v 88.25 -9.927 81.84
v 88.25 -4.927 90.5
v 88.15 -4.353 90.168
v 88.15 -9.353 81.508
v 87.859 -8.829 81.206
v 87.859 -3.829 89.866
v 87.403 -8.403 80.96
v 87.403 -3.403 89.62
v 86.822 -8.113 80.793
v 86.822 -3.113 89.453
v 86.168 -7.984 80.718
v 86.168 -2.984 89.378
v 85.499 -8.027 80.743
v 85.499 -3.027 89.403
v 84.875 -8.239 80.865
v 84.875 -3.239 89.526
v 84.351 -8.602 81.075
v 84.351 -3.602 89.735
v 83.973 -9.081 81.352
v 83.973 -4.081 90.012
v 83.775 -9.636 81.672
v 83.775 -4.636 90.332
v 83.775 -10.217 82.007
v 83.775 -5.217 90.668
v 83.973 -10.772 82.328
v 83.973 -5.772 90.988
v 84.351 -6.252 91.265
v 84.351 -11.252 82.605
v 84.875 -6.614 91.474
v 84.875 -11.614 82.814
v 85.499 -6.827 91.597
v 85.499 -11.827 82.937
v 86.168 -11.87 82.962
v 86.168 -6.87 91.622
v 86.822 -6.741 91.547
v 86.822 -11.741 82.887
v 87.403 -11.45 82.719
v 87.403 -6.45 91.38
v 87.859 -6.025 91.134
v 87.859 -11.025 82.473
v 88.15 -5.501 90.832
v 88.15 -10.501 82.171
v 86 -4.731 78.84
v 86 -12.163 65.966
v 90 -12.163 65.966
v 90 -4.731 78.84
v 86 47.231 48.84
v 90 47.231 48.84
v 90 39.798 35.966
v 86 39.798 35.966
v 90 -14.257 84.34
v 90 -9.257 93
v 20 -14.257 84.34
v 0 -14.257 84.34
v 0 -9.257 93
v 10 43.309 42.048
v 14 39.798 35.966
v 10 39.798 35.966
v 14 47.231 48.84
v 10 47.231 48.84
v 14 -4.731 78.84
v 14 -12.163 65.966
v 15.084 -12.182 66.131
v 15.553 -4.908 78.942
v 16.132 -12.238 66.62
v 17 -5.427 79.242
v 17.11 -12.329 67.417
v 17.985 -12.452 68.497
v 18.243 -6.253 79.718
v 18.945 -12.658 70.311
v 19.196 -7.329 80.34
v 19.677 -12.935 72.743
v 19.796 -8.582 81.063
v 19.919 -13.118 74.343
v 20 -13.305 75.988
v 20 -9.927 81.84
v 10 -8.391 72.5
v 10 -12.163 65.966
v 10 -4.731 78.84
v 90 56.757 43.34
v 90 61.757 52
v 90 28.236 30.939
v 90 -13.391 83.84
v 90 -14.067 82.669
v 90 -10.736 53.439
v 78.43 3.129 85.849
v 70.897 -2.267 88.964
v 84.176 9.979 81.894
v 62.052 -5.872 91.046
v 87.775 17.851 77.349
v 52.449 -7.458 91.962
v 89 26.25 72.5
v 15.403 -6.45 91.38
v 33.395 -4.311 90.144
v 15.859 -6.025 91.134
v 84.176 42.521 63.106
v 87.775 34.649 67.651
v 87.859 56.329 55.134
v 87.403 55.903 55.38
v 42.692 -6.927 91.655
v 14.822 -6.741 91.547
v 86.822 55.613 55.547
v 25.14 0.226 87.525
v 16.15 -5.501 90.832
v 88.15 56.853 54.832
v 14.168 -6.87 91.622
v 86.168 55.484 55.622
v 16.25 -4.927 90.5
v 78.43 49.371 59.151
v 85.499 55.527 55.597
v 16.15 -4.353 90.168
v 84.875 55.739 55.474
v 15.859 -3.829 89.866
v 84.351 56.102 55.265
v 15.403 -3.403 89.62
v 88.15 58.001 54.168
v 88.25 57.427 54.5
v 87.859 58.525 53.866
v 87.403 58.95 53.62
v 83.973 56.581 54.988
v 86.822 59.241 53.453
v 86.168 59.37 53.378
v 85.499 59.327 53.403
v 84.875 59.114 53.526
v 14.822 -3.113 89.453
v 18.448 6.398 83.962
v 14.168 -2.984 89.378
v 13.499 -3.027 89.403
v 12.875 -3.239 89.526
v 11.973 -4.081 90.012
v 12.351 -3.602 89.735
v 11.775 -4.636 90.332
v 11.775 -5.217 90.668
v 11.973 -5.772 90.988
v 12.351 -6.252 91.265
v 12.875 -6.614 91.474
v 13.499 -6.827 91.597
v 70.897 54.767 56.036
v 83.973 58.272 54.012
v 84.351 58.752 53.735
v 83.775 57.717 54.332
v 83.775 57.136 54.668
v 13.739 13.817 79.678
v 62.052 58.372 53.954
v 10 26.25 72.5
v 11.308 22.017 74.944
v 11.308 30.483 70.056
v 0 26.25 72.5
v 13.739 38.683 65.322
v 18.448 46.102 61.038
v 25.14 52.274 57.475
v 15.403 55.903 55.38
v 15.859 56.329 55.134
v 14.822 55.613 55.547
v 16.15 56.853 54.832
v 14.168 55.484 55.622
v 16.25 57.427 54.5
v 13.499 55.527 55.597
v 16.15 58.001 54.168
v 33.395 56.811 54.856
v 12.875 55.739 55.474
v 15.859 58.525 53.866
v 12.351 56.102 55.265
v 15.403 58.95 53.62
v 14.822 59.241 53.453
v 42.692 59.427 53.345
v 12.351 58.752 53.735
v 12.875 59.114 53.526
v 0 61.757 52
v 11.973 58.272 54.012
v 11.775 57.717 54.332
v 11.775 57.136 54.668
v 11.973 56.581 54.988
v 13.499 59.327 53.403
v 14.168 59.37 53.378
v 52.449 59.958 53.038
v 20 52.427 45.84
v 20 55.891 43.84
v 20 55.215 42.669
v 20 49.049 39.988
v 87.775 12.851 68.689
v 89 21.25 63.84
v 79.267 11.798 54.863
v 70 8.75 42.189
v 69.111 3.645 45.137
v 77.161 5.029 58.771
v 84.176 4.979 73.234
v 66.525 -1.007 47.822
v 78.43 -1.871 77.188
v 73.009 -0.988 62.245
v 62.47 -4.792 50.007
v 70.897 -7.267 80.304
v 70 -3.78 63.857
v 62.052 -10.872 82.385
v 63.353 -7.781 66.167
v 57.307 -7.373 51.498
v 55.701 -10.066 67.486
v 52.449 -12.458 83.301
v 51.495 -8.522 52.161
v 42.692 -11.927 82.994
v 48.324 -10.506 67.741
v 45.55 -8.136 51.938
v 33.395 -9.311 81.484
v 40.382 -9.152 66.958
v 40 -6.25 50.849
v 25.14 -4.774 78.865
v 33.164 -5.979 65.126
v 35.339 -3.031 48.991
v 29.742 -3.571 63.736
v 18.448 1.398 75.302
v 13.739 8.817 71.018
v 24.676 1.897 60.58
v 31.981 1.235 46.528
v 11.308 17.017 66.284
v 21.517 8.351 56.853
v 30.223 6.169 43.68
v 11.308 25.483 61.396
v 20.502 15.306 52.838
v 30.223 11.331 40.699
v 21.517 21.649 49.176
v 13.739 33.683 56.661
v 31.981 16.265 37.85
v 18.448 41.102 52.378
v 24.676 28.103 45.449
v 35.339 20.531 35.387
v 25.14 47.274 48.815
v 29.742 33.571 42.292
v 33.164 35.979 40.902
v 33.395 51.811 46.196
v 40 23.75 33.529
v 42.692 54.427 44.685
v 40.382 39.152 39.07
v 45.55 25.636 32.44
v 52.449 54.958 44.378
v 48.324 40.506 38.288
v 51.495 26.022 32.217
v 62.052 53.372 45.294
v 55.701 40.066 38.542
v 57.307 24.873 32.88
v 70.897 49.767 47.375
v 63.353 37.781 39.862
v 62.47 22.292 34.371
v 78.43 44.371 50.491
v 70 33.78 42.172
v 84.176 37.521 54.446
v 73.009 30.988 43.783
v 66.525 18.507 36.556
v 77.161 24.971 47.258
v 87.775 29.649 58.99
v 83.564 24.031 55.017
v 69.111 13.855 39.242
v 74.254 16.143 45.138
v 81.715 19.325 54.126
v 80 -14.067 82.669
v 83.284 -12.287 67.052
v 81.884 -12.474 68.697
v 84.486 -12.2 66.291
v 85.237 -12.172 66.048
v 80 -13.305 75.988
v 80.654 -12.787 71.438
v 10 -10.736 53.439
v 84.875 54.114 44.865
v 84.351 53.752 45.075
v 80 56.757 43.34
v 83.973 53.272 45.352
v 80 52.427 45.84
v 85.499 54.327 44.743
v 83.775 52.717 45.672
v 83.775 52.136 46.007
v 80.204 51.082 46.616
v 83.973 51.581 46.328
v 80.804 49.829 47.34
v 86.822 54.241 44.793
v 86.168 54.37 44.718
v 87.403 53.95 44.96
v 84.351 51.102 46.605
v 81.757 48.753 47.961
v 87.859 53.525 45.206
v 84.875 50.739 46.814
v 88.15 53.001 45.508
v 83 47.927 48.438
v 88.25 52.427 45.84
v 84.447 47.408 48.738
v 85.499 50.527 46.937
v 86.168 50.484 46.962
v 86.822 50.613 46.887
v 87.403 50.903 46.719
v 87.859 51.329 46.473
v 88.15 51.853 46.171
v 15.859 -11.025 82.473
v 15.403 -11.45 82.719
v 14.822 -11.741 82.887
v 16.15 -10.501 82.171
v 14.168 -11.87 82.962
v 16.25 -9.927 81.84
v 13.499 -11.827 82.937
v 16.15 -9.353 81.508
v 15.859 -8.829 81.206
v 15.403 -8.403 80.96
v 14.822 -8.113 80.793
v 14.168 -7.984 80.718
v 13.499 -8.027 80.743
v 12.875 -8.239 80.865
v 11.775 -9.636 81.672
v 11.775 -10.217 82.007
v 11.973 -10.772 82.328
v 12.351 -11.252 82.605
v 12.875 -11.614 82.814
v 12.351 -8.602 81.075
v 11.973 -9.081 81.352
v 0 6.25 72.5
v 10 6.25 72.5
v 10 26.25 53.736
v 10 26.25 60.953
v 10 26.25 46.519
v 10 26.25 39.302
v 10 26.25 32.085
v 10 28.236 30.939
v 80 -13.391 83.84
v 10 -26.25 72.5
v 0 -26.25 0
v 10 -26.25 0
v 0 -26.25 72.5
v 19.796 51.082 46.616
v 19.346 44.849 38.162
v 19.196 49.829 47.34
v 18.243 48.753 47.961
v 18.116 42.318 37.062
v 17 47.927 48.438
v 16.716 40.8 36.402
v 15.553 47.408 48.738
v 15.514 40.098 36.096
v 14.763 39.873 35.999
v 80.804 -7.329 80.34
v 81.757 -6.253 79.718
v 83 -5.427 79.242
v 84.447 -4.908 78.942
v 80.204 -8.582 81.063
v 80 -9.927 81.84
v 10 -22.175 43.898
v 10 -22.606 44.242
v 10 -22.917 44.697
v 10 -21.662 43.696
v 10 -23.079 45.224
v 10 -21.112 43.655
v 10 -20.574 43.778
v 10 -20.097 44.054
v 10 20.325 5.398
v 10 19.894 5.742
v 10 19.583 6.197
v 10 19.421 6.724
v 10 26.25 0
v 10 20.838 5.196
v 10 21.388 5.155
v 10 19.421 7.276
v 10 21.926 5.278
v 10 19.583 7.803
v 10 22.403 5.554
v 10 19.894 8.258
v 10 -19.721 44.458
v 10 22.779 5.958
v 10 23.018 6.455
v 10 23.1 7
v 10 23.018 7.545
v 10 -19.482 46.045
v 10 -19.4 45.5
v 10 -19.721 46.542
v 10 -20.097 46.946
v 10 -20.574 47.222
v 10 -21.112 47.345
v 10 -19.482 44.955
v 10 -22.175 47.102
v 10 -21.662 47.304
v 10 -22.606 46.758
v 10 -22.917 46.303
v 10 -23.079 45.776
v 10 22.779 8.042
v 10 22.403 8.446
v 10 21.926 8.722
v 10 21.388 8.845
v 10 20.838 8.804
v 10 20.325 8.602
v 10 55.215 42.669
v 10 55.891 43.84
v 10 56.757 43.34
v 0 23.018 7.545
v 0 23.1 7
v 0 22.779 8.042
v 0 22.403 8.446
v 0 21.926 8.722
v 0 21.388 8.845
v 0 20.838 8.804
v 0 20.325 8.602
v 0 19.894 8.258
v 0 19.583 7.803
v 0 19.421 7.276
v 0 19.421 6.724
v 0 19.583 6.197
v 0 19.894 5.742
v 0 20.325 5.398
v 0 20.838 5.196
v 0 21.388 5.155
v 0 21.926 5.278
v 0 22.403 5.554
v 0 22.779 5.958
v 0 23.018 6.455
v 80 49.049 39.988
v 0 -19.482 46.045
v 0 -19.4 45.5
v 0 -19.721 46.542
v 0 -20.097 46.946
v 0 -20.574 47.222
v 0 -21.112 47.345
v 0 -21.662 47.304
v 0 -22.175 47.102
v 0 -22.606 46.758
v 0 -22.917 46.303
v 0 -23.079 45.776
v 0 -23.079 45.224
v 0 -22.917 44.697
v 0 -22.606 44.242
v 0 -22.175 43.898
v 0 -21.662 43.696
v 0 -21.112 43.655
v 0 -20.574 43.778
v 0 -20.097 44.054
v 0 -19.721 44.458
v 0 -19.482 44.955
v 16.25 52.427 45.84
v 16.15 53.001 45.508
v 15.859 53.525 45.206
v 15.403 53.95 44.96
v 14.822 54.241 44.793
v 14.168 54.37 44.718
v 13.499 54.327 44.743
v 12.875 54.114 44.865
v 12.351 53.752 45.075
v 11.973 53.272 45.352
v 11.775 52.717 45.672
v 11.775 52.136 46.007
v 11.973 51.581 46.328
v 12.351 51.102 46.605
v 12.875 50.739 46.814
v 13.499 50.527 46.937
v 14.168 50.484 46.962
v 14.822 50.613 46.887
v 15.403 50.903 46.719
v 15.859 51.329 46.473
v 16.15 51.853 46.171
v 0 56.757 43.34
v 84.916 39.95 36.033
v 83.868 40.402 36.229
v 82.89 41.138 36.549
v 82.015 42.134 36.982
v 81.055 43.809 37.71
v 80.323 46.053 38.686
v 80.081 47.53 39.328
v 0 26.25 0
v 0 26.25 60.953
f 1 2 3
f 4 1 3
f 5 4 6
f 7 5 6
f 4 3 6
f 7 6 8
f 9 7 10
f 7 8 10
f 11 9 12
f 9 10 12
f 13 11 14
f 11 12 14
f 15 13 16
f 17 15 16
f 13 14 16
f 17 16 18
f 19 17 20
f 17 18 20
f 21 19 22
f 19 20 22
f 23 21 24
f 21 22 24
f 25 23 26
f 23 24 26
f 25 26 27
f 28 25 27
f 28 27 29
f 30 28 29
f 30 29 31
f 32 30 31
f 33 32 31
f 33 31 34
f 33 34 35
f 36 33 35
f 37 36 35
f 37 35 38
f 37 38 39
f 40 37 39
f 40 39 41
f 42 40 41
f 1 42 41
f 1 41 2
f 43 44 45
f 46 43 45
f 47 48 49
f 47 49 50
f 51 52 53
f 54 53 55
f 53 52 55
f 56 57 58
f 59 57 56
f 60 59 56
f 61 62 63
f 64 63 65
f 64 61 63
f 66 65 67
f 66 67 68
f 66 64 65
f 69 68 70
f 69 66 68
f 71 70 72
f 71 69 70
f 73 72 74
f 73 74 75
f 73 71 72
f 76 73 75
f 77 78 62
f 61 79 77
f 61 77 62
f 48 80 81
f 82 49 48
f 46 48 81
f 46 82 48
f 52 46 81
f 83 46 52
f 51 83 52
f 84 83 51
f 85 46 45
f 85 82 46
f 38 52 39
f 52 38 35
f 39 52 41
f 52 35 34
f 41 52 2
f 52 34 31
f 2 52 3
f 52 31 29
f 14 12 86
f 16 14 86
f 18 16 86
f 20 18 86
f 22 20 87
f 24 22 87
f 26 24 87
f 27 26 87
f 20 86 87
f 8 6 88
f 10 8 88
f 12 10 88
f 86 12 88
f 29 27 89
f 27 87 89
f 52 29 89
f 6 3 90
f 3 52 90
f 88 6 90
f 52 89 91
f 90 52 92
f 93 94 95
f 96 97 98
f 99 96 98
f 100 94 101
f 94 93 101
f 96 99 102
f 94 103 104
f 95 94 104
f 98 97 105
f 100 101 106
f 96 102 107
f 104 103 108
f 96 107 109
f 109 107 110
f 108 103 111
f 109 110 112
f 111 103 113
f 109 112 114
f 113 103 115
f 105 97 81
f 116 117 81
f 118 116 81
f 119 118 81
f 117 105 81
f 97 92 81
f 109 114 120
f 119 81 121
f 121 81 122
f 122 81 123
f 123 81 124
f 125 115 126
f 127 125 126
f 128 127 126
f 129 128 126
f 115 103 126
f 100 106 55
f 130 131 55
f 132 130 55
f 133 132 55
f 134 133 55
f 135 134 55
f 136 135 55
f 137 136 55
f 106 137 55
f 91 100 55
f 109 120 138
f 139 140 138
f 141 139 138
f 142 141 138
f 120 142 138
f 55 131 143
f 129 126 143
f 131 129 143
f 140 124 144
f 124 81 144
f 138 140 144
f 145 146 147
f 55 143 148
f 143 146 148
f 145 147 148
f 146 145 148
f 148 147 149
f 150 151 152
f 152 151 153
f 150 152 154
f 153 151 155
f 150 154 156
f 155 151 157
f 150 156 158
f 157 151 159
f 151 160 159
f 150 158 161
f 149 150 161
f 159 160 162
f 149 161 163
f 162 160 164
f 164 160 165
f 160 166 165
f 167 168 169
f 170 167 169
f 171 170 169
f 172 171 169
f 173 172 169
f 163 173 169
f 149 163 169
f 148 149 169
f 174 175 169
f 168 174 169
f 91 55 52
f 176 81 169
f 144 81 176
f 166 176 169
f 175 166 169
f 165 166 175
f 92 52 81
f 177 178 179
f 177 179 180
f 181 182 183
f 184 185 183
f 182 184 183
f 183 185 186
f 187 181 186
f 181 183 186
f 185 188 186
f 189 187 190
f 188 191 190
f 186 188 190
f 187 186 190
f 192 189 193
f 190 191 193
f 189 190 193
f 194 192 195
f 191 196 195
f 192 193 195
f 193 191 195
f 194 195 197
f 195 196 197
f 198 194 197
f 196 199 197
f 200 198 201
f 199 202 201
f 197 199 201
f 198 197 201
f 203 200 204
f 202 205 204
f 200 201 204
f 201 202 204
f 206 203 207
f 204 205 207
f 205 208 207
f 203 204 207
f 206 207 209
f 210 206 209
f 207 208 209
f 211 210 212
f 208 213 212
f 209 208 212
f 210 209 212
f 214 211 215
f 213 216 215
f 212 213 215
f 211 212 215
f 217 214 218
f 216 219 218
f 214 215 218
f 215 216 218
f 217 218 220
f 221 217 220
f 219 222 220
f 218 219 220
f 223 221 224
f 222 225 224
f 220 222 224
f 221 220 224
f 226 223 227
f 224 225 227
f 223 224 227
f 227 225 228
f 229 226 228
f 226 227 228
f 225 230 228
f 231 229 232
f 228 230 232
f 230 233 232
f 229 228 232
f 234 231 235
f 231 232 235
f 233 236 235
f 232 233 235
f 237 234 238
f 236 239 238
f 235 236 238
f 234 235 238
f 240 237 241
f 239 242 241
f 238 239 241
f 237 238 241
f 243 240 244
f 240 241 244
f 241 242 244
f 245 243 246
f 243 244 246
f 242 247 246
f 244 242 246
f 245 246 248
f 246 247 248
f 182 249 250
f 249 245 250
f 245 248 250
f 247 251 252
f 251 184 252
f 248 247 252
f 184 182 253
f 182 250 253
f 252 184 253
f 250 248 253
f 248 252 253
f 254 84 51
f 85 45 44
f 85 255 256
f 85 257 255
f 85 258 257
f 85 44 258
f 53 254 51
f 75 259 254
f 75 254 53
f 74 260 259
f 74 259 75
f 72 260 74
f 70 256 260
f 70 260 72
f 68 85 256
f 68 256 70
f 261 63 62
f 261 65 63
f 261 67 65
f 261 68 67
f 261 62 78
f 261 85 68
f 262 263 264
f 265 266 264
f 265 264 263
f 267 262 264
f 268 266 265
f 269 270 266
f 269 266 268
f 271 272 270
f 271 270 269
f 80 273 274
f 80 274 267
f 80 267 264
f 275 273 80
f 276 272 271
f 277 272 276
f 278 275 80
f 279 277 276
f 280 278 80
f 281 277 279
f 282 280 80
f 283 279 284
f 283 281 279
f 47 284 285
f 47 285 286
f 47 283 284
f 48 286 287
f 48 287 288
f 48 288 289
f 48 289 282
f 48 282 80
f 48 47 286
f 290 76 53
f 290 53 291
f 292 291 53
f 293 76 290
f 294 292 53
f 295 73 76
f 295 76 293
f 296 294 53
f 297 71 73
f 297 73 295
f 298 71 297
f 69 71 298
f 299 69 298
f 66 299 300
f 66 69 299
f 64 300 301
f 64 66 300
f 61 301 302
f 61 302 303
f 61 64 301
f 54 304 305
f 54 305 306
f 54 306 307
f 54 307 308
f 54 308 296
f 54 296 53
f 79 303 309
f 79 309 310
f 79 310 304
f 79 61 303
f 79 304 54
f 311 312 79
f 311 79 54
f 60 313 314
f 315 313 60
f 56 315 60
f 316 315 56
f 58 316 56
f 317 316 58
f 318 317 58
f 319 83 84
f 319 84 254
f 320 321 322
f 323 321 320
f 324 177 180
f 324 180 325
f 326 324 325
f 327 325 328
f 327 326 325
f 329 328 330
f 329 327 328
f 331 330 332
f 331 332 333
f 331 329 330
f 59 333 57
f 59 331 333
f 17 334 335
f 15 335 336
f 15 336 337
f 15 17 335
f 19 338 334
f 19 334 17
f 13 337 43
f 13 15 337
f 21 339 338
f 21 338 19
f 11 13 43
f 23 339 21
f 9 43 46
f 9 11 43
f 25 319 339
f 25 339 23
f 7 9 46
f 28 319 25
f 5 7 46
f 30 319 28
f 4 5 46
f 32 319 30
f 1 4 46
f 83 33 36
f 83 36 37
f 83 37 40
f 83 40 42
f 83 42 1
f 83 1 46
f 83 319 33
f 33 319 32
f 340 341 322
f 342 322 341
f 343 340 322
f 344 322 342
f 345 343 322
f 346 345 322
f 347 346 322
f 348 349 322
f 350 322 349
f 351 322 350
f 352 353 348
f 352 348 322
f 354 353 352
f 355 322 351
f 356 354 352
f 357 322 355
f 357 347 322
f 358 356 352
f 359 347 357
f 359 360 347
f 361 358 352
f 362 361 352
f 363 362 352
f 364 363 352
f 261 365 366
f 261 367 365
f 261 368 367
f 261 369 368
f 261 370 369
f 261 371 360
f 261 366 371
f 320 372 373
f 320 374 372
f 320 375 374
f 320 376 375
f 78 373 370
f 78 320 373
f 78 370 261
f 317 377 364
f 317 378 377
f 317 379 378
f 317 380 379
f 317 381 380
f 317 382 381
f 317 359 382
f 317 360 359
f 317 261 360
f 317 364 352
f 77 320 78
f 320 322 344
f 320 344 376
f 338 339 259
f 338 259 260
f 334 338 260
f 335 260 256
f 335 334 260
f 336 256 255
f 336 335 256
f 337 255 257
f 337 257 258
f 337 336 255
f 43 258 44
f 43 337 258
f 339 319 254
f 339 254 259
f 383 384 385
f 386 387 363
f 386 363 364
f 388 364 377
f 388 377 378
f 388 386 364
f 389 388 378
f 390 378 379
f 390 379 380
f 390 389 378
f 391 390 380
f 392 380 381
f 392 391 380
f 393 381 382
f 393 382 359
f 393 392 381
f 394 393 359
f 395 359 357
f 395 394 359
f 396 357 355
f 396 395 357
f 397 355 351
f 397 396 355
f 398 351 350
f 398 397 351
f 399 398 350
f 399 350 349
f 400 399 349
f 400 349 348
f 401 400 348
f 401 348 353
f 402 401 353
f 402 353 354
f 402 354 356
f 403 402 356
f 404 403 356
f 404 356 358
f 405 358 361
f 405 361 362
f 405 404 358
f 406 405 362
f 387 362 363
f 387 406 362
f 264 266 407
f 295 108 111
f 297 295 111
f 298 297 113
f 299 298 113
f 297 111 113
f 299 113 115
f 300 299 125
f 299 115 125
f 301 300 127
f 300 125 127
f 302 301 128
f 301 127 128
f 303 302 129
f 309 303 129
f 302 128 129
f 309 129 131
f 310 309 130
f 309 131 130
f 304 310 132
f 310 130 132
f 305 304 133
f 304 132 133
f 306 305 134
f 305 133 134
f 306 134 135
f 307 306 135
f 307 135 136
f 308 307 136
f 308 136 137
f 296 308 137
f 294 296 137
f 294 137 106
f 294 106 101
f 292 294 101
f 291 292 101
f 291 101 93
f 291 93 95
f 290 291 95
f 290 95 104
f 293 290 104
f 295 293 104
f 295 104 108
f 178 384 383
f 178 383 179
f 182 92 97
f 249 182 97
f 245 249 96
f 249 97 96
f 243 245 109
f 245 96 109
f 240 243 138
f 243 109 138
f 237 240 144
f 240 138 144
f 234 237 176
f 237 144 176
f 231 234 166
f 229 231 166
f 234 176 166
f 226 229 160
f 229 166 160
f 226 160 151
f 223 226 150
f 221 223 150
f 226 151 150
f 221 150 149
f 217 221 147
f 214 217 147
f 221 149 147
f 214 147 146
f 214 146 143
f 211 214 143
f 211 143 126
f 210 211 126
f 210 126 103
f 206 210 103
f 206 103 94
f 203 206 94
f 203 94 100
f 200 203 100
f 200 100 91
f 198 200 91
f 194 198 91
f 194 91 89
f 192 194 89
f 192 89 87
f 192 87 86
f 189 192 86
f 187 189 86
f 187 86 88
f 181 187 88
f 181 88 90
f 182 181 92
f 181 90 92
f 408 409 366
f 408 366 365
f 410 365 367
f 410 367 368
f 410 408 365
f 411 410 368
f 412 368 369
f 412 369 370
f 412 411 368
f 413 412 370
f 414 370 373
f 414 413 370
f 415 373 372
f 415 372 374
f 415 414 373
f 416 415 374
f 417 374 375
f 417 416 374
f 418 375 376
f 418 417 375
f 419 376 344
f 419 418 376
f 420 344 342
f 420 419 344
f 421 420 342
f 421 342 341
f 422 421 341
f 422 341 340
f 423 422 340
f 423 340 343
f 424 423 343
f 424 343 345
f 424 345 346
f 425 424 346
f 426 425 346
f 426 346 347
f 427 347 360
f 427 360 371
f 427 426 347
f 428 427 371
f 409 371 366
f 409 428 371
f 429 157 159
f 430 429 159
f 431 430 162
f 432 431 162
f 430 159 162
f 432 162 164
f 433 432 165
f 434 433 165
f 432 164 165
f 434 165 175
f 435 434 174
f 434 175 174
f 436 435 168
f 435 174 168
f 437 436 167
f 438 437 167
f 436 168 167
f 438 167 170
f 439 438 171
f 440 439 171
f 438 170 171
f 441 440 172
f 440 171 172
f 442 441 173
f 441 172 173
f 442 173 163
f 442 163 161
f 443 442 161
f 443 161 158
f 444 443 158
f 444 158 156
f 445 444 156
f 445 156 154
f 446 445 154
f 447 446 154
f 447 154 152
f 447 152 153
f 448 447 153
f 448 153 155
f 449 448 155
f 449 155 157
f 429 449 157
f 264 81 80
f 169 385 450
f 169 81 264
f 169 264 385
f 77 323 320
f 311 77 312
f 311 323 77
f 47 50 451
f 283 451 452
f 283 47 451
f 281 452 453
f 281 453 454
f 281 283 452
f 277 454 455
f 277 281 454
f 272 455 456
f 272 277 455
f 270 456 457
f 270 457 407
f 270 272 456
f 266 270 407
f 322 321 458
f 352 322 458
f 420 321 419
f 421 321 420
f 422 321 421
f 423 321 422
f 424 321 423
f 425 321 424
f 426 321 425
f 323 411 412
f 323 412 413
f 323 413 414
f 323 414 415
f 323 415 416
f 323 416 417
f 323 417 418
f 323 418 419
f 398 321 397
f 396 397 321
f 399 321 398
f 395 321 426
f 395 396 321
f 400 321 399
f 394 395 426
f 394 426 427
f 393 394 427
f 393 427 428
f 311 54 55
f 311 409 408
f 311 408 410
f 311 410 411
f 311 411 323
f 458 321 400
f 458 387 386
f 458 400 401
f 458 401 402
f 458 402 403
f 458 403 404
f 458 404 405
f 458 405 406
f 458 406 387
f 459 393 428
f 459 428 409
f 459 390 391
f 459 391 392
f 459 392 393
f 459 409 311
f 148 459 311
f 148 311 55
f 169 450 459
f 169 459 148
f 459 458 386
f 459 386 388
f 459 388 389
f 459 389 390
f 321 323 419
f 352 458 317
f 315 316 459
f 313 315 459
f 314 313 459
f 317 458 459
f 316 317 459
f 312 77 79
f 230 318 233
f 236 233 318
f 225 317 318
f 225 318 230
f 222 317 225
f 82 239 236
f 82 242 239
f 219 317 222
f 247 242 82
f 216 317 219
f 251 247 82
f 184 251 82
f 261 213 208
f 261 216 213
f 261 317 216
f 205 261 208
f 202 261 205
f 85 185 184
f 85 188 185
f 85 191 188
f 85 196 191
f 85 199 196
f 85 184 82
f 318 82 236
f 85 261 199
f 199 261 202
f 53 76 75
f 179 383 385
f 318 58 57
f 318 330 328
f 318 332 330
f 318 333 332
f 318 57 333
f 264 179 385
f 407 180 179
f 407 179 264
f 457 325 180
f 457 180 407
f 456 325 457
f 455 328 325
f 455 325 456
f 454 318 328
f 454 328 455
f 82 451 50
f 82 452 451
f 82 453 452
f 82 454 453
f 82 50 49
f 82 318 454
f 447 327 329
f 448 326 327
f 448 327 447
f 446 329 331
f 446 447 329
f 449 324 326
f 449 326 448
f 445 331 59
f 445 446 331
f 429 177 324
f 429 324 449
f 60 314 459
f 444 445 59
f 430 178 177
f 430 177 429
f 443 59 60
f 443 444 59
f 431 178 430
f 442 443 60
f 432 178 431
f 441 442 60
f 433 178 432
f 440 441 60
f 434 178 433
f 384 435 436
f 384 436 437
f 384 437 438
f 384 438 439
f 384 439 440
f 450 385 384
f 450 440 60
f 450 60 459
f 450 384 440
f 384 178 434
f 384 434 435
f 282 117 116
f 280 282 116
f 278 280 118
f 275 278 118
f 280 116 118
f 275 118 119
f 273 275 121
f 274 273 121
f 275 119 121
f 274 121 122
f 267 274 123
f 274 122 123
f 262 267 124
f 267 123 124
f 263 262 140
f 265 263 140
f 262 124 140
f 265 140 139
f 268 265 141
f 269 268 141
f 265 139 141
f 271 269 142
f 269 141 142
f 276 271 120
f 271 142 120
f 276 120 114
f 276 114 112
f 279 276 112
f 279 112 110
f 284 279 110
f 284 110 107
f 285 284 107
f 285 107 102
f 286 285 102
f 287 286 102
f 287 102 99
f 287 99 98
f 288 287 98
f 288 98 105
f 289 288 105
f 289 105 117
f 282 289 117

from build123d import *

# Parameters (mm, degrees)
F0_W      = 52.5
F0_H      = 72.5
F0_R      = 1.85
F1_DEPTH  = 10
F3_W      = 90
F3_H      = 10
F4_DEPTH  = 41
F5_R      = 2.25
F5_R_2    = 39
F7_DEPTH  = 89.0378417744
F9_W      = 80
F9_H      = 82
F8_W      = 80
F8_H      = 45
F11_R     = 39
F12_R     = 20
F15_DEPTH = 25


with BuildPart() as f1:
    # F0 (on Right) → F1 (new body)
    with BuildSketch(Plane.YZ):
        with Locations((0, 36.25)):
            Rectangle(F0_W, F0_H)
        with Locations((21.25, 7)):
            Circle(F0_R, mode=Mode.SUBTRACT)
        with Locations((-21.25, 45.5)):
            Circle(F0_R, mode=Mode.SUBTRACT)
    extrude(amount=F1_DEPTH)

    # F3 (on face) → F4 (join, symmetric)
    with BuildSketch(Plane(origin=(0, -11.7059208872, 6.7584165753), x_dir=(-1, 0, 0), z_dir=(0, 0.8660254038, -0.5))):
        with Locations((-45, 70.9118417744)):
            Rectangle(F3_W, F3_H)
    extrude(amount=F4_DEPTH, both=True)

    # F5 (on face) → F7 (cut, through all)
    with BuildSketch(Plane(origin=(0, 37.9559208872, 65.7415834247), x_dir=(1, 0, 0), z_dir=(0, 0.5, 0.8660254038))):
        with Locations((14, -49.5168331507)):
            Circle(F5_R)
        with Locations((86, -49.5168331507)):
            Circle(F5_R)
        with Locations((86, 22.4831668493)):
            Circle(F5_R)
        with Locations((14, 22.4831668493)):
            Circle(F5_R)
        with Locations((50, -13.5168331507)):
            Circle(F5_R_2)
    extrude(amount=-F7_DEPTH, mode=Mode.SUBTRACT)

    # F9 (on face) → F10 section 0
    with BuildSketch(Plane(origin=(0, 32.9559208872, 57.0813293868), x_dir=(1, 0, 0), z_dir=(0, -0.5, -0.8660254038))):
        with Locations((50, 13.5168331507)):
            Rectangle(F9_W, F9_H)
    # F8 (on offset) → F10 section 1
    with BuildSketch(Plane(origin=(0, 20.4559208872, 35.4306942922), x_dir=(1, 0, 0), z_dir=(0, -0.5, -0.8660254038))):
        with Locations((50, 13.5168331507)):
            Rectangle(F8_W, F8_H)
    loft()

    # F11 (on face) → F13 section 0
    with BuildSketch(Plane(origin=(0, 32.9559208872, 57.0813293868), x_dir=(1, 0, 0), z_dir=(0, -0.5, -0.8660254038))):
        with Locations((50, 13.5168331507)):
            Circle(F11_R)
    # F12 (on face) → F13 section 1
    with BuildSketch(Plane(origin=(0, 20.4559208872, 35.4306942922), x_dir=(1, 0, 0), z_dir=(0, -0.5, -0.8660254038))):
        with Locations((50, 13.5168331507)):
            Circle(F12_R)
    loft(mode=Mode.SUBTRACT)

    # F14 (on face) → F15 (cut, through all)
    with BuildSketch(Plane(origin=(0, 32.9559208872, 57.0813293868), x_dir=(1, 0, 0), z_dir=(0, -0.5, -0.8660254038))):
        with BuildLine():
            Line((10, 43.5168331507), (14, 43.5168331507))
            ThreePointArc((14, 43.5168331507), (18.2426406871, 45.2741924635), (20, 49.5168331507))
            Line((20, 49.5168331507), (20, 54.5168331507))
            Line((20, 54.5168331507), (10, 54.5168331507))
            Line((10, 54.5168331507), (10, 43.5168331507))
        make_face()
        with BuildLine():
            Line((9, -26.4831668493), (20, -26.4831668493))
            Line((20, -26.4831668493), (20, -22.4831668493))
            ThreePointArc((20, -22.4831668493), (18.2426406871, -18.2405261622), (14, -16.4831668493))
            Line((14, -16.4831668493), (9, -16.4831668493))
            Line((9, -16.4831668493), (9, -26.4831668493))
        make_face()
        with BuildLine():
            Line((90, -27.4831668493), (90, -16.4831668493))
            Line((90, -16.4831668493), (86, -16.4831668493))
            ThreePointArc((86, -16.4831668493), (81.7573593129, -18.2405261622), (80, -22.4831668493))
            Line((80, -22.4831668493), (80, -27.4831668493))
            Line((80, -27.4831668493), (90, -27.4831668493))
        make_face()
        with BuildLine():
            Line((91, 53.5168331507), (80, 53.5168331507))
            Line((80, 53.5168331507), (80, 49.5168331507))
            ThreePointArc((80, 49.5168331507), (81.7573593129, 45.2741924635), (86, 43.5168331507))
            Line((86, 43.5168331507), (91, 43.5168331507))
            Line((91, 43.5168331507), (91, 53.5168331507))
        make_face()
    extrude(amount=F15_DEPTH, mode=Mode.SUBTRACT)


solid = f1.part
